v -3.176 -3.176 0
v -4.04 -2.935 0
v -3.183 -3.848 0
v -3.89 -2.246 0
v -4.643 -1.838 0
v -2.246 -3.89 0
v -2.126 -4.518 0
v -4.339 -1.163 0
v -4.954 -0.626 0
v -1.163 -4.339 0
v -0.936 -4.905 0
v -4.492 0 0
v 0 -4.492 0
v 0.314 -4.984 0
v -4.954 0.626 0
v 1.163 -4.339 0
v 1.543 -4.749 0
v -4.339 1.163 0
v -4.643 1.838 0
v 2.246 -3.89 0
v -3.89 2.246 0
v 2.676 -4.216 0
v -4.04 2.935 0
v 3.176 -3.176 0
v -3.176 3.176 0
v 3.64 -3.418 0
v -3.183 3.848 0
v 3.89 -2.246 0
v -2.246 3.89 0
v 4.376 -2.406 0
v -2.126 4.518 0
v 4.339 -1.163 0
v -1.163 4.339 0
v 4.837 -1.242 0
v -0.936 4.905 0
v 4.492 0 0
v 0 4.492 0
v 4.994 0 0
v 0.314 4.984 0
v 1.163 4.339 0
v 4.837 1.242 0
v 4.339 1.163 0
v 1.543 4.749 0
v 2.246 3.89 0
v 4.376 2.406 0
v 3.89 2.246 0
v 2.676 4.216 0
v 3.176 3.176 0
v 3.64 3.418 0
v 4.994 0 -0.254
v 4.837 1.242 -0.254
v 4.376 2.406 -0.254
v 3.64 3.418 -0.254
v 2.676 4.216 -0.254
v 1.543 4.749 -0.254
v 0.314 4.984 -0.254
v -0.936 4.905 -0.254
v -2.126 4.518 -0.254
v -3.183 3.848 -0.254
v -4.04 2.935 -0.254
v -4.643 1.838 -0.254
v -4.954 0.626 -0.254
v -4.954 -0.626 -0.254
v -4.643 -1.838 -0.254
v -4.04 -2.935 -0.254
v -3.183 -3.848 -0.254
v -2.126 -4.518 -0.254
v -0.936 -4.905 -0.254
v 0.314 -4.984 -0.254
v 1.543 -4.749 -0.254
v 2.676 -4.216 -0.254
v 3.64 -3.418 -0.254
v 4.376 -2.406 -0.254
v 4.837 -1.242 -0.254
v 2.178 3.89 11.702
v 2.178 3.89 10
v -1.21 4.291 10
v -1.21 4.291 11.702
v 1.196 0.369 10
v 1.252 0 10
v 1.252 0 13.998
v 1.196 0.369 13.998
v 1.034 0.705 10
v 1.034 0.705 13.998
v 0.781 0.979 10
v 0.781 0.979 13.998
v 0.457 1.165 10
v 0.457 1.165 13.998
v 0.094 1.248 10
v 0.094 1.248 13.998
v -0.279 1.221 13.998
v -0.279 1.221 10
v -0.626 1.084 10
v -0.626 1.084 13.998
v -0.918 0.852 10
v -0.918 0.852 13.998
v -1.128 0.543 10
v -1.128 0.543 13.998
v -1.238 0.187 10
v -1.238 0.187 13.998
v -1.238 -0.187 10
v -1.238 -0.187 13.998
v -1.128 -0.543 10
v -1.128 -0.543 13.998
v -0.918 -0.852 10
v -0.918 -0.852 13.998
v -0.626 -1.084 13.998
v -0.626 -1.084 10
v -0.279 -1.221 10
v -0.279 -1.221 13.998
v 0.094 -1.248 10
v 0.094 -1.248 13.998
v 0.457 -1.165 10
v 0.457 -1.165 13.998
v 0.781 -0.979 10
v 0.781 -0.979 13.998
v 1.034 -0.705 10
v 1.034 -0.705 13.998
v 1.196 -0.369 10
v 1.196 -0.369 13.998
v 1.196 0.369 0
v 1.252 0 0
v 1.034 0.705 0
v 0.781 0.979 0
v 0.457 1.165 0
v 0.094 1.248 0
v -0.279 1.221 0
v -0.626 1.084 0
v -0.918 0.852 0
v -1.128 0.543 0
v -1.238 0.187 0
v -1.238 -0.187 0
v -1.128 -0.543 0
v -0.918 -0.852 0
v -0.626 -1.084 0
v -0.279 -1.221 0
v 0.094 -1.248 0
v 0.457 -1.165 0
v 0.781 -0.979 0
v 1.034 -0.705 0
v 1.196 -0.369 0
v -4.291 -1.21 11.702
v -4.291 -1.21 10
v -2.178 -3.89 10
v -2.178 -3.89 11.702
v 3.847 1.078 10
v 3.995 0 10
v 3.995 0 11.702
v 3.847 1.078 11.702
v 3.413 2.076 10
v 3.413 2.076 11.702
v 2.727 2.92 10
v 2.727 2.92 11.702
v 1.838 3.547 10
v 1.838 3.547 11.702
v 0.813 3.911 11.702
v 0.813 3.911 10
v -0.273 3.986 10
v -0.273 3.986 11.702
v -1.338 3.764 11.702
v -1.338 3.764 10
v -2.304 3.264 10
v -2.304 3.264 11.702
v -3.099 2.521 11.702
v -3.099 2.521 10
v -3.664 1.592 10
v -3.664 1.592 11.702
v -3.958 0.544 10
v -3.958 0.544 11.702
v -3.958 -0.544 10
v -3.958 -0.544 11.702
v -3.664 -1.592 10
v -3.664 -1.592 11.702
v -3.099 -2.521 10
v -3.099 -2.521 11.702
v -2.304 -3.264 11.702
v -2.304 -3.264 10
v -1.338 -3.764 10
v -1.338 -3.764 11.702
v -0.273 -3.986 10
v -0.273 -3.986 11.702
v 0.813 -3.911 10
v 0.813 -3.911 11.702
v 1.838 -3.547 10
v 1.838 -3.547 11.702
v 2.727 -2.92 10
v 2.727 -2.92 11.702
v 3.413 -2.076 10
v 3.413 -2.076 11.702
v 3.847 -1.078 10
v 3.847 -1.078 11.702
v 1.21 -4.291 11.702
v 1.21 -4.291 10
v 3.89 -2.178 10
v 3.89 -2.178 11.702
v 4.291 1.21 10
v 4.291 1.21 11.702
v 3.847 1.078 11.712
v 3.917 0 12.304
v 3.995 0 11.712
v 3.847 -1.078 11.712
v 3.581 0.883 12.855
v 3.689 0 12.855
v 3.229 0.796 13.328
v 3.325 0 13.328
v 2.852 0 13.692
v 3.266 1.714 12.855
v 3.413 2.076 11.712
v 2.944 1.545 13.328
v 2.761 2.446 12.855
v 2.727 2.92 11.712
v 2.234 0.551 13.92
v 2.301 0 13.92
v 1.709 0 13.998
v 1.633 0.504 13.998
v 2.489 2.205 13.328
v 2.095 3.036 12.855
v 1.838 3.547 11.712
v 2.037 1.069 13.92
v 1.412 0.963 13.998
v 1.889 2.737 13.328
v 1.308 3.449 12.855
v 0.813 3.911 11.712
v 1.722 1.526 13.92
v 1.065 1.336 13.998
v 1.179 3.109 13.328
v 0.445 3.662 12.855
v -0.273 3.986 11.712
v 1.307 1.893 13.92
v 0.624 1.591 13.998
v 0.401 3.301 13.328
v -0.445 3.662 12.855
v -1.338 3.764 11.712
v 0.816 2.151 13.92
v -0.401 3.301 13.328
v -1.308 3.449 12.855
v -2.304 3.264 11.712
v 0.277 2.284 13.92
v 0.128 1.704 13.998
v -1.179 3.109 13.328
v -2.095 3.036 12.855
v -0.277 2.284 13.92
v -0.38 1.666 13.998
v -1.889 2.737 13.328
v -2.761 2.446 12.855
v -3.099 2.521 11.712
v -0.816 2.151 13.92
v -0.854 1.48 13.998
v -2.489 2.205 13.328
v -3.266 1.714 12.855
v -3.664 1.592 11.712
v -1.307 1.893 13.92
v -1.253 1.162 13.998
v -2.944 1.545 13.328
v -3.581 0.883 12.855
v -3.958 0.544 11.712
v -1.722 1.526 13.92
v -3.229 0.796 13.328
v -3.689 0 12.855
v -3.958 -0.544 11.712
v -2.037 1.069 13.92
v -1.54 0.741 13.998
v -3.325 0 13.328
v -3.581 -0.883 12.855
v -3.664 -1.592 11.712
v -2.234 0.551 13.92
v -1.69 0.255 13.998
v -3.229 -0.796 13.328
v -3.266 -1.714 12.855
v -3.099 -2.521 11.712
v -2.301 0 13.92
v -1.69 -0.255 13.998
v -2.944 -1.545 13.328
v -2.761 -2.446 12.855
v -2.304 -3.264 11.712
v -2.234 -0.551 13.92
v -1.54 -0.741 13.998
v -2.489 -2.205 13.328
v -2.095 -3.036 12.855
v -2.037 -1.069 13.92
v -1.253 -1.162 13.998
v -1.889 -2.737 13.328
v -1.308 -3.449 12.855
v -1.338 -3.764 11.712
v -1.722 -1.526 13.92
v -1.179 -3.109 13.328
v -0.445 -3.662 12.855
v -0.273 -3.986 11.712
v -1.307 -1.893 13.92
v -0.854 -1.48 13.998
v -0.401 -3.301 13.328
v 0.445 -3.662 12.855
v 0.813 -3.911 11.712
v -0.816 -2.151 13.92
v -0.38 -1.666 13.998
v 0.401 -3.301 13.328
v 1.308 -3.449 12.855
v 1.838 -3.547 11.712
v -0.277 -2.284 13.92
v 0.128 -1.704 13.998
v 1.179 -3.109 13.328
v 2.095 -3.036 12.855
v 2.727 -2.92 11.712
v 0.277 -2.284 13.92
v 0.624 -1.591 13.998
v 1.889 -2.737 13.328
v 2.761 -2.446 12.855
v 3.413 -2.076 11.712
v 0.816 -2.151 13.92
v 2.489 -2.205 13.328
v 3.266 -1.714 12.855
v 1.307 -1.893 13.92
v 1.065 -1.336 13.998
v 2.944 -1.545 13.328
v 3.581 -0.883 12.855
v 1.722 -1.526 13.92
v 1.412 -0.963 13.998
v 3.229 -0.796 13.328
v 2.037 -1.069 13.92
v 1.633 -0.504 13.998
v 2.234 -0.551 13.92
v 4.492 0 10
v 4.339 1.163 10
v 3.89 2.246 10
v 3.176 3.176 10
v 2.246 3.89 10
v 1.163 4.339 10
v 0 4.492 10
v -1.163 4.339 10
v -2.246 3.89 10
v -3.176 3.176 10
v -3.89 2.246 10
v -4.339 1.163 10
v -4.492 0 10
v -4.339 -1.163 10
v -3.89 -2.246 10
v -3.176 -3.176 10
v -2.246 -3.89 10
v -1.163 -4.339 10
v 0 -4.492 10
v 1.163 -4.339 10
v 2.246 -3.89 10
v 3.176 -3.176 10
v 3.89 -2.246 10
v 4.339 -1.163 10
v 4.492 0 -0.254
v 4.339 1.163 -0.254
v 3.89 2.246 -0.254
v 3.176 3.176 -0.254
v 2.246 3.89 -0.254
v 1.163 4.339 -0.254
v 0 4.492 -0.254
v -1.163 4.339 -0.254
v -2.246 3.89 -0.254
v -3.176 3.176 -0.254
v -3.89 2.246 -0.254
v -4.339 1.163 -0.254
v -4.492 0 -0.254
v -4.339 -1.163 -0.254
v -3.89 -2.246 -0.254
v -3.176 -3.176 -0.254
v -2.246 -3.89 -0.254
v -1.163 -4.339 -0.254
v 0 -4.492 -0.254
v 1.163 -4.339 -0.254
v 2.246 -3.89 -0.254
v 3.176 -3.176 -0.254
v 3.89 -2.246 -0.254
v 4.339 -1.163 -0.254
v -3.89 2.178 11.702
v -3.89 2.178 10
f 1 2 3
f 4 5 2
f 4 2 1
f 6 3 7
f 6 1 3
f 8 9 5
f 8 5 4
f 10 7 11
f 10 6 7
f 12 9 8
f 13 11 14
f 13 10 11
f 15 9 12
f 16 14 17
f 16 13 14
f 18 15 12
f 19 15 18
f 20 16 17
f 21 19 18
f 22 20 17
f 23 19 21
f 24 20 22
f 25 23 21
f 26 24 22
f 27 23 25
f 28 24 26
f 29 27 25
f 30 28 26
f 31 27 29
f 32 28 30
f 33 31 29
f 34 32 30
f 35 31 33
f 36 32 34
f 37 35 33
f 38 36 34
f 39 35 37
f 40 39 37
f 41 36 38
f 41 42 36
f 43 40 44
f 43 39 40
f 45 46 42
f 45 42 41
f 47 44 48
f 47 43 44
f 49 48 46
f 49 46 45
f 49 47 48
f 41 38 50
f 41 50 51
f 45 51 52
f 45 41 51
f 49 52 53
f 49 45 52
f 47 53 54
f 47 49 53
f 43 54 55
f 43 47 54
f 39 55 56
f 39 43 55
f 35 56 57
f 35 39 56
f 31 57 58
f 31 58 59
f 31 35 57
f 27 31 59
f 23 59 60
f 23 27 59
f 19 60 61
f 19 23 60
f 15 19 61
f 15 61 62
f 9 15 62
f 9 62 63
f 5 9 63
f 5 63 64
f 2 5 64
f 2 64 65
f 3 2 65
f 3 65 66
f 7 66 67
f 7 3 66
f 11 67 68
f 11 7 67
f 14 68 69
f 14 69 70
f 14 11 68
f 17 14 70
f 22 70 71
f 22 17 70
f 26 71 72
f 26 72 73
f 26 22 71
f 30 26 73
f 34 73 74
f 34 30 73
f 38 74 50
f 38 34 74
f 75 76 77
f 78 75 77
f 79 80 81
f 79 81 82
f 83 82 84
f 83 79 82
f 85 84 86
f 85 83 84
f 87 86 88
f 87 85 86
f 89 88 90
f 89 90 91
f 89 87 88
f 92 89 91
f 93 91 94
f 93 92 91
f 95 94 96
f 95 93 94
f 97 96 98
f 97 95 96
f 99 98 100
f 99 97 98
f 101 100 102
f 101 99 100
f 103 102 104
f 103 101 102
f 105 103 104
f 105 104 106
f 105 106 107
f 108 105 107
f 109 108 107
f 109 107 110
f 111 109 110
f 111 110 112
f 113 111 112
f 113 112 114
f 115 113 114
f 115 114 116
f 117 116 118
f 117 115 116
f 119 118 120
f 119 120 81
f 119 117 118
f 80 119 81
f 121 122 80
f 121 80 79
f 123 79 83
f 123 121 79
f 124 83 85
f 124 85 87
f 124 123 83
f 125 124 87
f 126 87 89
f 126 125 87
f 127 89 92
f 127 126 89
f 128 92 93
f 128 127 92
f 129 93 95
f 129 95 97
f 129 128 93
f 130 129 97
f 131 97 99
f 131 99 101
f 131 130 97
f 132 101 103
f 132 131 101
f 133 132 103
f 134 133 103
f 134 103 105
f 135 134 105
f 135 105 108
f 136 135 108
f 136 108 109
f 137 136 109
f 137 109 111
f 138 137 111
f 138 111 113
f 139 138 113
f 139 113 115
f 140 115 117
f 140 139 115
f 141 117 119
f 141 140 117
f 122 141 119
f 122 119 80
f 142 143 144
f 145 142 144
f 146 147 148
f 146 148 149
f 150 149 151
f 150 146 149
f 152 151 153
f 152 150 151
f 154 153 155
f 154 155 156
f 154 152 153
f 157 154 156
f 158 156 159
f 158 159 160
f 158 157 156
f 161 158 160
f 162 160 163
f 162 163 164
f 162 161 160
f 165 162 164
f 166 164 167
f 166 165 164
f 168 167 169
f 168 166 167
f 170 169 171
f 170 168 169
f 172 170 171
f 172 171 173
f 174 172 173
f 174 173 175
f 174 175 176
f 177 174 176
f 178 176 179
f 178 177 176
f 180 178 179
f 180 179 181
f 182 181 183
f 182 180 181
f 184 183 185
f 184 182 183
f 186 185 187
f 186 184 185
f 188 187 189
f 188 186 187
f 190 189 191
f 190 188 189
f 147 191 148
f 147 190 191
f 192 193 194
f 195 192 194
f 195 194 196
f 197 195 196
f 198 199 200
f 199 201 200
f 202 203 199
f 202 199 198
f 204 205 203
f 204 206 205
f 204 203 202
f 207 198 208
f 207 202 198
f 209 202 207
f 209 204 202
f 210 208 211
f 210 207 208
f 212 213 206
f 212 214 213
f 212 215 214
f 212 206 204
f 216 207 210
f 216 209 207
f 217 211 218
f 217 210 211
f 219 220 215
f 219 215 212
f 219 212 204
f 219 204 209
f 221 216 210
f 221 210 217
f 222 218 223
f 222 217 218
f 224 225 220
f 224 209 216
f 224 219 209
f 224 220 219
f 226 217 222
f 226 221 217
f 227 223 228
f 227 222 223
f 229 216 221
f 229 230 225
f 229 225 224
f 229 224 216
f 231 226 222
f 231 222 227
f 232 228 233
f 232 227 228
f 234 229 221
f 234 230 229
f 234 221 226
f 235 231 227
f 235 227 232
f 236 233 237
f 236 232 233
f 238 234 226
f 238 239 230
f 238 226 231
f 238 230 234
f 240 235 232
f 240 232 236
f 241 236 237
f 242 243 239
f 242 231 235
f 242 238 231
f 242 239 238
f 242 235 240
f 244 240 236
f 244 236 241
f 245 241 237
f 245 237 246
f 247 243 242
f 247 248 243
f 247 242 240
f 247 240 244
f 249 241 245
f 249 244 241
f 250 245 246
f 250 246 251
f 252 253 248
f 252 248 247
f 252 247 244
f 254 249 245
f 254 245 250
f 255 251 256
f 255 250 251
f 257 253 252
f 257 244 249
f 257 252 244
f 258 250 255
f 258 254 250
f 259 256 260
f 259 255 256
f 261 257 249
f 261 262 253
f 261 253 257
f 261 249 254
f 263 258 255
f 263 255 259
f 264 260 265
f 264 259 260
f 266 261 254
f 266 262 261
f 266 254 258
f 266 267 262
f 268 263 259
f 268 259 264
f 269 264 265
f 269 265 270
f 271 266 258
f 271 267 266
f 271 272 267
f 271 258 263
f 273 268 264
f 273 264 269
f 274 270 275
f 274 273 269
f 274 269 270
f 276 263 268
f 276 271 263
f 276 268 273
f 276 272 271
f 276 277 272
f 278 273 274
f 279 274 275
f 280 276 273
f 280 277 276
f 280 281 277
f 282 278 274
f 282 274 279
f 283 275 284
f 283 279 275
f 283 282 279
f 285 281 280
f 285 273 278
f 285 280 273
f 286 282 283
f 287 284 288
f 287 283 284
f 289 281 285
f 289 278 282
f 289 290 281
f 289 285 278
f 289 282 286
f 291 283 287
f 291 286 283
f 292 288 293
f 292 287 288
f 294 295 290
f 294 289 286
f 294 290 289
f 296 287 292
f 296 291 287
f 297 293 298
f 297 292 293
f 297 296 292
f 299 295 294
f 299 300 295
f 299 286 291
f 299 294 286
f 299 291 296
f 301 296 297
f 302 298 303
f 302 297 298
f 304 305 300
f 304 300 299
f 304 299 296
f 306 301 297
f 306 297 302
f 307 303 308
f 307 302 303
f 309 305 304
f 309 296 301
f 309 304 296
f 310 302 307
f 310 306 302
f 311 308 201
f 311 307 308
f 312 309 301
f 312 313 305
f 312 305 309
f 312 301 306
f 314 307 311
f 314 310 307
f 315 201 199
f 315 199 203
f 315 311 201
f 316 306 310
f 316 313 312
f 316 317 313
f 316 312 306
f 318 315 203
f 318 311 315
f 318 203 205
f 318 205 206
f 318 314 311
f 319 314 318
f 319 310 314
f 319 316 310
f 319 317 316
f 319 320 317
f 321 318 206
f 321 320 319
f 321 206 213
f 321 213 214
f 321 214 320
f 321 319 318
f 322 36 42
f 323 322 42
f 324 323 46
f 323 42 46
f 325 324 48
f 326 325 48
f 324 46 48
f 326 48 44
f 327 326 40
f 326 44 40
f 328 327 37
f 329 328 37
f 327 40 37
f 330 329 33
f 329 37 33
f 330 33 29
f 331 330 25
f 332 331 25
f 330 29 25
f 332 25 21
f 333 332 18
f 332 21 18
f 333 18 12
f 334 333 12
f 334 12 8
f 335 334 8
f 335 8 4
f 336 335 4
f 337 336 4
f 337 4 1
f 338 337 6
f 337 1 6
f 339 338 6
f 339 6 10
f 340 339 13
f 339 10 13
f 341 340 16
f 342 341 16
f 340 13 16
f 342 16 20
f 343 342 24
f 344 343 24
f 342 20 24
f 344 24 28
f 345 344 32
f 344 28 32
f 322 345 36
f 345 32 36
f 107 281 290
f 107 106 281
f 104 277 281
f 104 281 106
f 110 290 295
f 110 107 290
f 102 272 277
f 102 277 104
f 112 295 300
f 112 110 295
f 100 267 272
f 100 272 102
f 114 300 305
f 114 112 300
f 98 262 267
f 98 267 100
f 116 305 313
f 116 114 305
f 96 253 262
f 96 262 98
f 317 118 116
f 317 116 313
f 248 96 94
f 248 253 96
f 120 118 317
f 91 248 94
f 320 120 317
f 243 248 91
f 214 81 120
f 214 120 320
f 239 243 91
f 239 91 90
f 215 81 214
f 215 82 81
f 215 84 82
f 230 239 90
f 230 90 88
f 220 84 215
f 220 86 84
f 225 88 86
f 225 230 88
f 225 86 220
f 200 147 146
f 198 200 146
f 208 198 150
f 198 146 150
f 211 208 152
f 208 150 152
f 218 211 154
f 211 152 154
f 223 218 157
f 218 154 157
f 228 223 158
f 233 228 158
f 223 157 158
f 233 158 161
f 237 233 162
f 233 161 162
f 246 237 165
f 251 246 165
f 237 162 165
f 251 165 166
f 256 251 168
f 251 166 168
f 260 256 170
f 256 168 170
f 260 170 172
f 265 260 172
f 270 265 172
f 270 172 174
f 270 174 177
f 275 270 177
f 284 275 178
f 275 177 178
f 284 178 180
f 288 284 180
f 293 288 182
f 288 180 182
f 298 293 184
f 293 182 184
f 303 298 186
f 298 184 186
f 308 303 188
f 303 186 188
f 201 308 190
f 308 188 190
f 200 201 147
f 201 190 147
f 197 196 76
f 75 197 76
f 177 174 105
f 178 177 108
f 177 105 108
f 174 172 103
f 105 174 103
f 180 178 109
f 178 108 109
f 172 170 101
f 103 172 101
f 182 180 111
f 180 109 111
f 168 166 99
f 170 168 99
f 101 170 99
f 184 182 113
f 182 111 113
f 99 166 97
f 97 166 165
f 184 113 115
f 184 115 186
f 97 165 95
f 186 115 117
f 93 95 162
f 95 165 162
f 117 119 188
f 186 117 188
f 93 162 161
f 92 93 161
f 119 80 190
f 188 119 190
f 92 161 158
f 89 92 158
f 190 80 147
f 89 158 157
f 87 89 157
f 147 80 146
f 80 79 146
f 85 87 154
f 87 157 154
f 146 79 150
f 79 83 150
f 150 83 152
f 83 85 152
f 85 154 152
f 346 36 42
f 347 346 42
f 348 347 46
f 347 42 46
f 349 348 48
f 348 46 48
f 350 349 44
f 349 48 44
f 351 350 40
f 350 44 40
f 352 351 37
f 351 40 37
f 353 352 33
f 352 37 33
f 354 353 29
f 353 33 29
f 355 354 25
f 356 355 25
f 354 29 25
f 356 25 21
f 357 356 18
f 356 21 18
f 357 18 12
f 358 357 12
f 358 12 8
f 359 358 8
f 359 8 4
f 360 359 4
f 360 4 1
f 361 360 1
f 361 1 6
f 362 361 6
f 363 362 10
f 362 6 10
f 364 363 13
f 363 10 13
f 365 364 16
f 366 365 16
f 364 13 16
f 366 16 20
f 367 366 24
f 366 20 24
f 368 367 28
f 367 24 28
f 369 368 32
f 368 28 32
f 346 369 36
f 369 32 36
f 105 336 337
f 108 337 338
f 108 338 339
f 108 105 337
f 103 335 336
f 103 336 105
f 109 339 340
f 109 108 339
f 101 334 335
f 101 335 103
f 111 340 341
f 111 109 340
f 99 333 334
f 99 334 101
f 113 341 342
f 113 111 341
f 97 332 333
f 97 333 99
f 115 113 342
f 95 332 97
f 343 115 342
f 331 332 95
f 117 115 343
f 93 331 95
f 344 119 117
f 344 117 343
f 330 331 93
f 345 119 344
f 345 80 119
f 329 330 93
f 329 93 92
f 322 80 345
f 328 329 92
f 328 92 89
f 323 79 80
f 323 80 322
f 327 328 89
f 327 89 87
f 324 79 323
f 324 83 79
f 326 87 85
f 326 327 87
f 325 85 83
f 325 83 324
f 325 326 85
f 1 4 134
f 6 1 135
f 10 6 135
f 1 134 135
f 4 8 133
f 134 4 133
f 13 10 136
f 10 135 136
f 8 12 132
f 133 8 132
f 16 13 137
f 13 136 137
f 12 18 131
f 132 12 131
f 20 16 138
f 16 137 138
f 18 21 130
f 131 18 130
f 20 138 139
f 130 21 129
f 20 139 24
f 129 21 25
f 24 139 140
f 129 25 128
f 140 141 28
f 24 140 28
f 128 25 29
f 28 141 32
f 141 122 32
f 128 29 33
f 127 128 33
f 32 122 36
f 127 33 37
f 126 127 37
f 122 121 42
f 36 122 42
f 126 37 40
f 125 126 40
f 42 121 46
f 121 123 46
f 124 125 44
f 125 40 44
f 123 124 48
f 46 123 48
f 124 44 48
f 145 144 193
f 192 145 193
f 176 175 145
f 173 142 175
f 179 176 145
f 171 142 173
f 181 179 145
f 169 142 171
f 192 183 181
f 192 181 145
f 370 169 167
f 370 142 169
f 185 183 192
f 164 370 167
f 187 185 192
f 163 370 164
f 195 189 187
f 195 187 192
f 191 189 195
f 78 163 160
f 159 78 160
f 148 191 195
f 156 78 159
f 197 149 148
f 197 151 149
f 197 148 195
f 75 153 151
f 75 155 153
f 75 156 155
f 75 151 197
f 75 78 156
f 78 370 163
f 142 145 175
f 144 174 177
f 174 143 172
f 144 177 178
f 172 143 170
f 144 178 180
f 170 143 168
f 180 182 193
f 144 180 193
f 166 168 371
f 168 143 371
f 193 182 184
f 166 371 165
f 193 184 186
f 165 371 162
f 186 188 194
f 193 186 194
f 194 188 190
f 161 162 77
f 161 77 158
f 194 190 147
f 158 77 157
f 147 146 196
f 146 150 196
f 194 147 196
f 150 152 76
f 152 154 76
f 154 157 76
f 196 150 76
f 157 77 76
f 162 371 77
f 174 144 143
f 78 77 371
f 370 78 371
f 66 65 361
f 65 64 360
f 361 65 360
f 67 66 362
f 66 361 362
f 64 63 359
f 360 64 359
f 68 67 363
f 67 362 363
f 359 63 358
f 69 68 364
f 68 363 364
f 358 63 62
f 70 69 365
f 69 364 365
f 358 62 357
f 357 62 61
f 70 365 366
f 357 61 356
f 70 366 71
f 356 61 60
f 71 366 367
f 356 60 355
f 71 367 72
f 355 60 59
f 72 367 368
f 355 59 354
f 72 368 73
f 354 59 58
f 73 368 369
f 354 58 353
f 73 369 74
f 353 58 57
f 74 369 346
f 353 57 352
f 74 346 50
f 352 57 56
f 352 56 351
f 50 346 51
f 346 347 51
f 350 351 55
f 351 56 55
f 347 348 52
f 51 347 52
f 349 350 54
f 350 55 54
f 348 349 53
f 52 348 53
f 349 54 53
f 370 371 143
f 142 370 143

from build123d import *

# Parameters (mm, degrees)
F0_R     = 4.491706
F0_R_2   = 1.251915
F1_DEPTH = 9.99998
F0_R_3   = 4.993585
F2_DEPTH = 0.254
F3_R     = 3.99486
F3_R_2   = 1.251915
F4_DEPTH = 3.99796
F5_R     = 2.286
F6_DEPTH = 1.7018


with BuildPart() as f1:
    # F0 (on Top) → F1 (new body)
    with BuildSketch(Plane.XY):
        Circle(F0_R)
        Circle(F0_R_2, mode=Mode.SUBTRACT)
    extrude(amount=F1_DEPTH)

    # F0 (on Top) → F2 (join)
    with BuildSketch(Plane.XY):
        Circle(F0_R_3)
        Circle(F0_R, mode=Mode.SUBTRACT)
    extrude(amount=-F2_DEPTH)


with BuildPart() as f4:
    # F3 (on face) → F4 (new body)
    with BuildSketch(Plane.XY.offset(9.99998)):
        Circle(F3_R)
        Circle(F3_R_2, mode=Mode.SUBTRACT)
    extrude(amount=F4_DEPTH)

    # F5
    f5_edges = [f4.edges().sort_by_distance(p)[0] for p in [
        (-3.99486, 0, 13.99794),
    ]]
    fillet(f5_edges, radius=F5_R)


with BuildPart() as f6:
    # F3 (on face) → F6 (new body)
    with BuildSketch(Plane.XY.offset(9.99998)):
        Polygon((3.889913, -2.178242), (4.290833, 1.210334), (2.178242, 3.889913), (-1.210334, 4.290833), (-3.889913, 2.178242), (-4.290833, -1.210334), (-2.178242, -3.889913), (1.210334, -4.290833), align=None)
        Circle(F3_R, mode=Mode.SUBTRACT)
    extrude(amount=F6_DEPTH)


solid = Compound([f1.part, f4.part, f6.part])
